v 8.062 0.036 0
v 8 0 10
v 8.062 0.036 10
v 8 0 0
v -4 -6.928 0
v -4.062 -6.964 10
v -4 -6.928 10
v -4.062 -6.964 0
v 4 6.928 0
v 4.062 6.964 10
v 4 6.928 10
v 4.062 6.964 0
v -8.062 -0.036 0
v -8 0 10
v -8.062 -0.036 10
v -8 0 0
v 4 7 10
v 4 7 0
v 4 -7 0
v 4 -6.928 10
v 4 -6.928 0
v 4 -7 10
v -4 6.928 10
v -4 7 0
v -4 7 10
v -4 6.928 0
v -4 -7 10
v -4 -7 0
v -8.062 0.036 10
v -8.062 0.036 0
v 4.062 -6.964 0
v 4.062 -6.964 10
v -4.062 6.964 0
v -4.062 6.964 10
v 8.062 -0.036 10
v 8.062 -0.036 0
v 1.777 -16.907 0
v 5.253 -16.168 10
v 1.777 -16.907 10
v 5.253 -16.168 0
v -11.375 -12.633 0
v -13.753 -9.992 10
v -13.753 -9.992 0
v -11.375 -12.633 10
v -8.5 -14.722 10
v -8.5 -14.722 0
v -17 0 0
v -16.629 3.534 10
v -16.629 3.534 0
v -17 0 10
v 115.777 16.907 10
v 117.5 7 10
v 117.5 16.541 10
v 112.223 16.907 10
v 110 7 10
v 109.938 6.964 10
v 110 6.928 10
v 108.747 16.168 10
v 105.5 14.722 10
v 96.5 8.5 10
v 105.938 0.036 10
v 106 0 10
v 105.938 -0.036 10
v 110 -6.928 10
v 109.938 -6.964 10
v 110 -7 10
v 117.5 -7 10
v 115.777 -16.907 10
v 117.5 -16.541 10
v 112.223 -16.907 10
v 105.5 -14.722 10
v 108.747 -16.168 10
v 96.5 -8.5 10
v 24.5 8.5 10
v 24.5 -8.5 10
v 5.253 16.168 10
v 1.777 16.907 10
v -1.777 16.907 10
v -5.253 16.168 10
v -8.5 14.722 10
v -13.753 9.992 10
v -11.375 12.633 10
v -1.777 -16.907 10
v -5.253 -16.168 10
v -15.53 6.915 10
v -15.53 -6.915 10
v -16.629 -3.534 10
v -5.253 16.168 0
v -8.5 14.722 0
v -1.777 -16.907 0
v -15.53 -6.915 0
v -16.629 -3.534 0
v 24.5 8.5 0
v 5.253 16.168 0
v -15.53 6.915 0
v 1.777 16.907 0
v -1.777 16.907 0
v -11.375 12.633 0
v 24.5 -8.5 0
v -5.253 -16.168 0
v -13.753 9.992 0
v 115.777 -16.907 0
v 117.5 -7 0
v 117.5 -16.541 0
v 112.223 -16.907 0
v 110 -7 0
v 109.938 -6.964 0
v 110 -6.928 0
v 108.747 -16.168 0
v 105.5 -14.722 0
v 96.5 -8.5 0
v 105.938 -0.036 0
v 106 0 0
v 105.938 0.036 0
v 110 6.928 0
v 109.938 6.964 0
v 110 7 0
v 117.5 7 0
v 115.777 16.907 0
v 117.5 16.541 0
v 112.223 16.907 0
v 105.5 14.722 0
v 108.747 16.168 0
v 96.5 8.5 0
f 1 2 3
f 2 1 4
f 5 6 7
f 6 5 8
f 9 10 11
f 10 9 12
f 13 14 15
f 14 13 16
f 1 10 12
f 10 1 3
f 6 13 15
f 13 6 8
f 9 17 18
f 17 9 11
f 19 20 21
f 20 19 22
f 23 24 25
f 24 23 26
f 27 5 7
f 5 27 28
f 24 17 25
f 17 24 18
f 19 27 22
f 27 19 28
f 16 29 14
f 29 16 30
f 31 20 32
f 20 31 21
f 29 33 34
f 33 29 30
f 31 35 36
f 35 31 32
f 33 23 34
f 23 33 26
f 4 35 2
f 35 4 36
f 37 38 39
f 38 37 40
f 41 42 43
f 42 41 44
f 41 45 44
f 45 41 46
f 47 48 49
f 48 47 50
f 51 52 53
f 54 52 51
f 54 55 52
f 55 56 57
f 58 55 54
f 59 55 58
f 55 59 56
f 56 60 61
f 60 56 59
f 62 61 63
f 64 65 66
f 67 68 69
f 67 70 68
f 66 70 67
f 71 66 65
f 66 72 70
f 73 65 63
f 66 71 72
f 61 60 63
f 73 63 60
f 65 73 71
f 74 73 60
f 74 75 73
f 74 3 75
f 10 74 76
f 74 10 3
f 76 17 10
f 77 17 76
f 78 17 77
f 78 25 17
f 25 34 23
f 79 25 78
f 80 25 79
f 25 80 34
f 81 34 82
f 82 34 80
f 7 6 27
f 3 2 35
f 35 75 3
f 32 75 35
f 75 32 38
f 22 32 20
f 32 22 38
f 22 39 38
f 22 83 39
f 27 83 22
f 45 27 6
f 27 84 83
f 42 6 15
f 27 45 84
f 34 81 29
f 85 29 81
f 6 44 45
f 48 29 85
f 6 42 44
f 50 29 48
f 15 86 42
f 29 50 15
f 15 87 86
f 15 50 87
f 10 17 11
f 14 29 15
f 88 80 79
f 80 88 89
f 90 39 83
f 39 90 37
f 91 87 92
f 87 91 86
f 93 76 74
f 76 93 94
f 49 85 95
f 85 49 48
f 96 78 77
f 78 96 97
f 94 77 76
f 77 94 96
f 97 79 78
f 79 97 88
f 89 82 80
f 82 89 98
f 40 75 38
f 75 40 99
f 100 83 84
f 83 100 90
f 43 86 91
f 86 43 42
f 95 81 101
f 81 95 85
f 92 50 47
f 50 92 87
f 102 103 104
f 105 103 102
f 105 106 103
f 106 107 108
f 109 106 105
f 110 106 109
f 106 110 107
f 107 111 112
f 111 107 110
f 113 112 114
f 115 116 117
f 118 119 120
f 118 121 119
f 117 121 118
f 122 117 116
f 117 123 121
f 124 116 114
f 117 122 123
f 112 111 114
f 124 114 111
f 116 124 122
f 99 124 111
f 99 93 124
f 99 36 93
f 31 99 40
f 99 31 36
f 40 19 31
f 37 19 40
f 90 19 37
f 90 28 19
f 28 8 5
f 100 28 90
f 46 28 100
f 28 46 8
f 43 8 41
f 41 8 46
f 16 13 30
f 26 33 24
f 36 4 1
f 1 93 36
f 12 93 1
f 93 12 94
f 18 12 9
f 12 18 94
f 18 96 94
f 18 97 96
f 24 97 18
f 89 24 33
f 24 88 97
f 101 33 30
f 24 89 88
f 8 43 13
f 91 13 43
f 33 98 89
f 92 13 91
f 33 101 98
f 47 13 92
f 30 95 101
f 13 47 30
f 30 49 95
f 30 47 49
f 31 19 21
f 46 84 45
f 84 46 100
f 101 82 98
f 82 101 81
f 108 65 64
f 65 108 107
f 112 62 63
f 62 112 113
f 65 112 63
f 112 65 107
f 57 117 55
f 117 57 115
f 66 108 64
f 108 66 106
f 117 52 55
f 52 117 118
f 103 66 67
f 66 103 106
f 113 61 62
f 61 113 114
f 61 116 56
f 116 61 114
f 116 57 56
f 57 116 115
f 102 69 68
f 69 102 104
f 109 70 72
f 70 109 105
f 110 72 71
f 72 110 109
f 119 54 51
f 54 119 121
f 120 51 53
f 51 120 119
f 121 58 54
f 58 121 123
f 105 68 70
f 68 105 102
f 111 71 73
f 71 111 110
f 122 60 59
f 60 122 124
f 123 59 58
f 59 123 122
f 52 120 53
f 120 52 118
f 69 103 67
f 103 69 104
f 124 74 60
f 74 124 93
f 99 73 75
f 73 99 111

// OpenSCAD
l = 14;  // side length of hex nut
th=3;  // wall thickness
h=10;  // height
l_handle = 80;  // length of handle
w_handle = th;  // width of handle
r=l+th;  // outer radius of wrench head

module hexagon(size, height) {
  boxWidth = size/1.75;
  for (r = [-60, 0, 60]) rotate([0,0,r]) cube([boxWidth, size, height], true);
}

// hexagon cutout head
difference(){
  hull(){
    cylinder(r=r, h=h);
    translate([r+5,0,h/2])
      cube([min(5, l_handle), l+th, h], center=true);
  }
  translate([0,0,h/2])
    hexagon(l, h+.1);
}

// handle
translate([r+l_handle/2+5,0,h/2]) {
#cube([l_handle-5, r, h], center=true);
}

// regular wrench head

translate([r+l_handle+r,0,0]) {
  difference(){
    hull(){
      translate([-r,0,h/2])cube([1,r,h], center=true);
      cylinder(r=r, h=h);
    }
    translate([0,0,h/2])hexagon(l, h+.1);
    translate([r/2+l/4,0,h/2])
      cube([r, 2*r, h+1], center=true);

  }
}
